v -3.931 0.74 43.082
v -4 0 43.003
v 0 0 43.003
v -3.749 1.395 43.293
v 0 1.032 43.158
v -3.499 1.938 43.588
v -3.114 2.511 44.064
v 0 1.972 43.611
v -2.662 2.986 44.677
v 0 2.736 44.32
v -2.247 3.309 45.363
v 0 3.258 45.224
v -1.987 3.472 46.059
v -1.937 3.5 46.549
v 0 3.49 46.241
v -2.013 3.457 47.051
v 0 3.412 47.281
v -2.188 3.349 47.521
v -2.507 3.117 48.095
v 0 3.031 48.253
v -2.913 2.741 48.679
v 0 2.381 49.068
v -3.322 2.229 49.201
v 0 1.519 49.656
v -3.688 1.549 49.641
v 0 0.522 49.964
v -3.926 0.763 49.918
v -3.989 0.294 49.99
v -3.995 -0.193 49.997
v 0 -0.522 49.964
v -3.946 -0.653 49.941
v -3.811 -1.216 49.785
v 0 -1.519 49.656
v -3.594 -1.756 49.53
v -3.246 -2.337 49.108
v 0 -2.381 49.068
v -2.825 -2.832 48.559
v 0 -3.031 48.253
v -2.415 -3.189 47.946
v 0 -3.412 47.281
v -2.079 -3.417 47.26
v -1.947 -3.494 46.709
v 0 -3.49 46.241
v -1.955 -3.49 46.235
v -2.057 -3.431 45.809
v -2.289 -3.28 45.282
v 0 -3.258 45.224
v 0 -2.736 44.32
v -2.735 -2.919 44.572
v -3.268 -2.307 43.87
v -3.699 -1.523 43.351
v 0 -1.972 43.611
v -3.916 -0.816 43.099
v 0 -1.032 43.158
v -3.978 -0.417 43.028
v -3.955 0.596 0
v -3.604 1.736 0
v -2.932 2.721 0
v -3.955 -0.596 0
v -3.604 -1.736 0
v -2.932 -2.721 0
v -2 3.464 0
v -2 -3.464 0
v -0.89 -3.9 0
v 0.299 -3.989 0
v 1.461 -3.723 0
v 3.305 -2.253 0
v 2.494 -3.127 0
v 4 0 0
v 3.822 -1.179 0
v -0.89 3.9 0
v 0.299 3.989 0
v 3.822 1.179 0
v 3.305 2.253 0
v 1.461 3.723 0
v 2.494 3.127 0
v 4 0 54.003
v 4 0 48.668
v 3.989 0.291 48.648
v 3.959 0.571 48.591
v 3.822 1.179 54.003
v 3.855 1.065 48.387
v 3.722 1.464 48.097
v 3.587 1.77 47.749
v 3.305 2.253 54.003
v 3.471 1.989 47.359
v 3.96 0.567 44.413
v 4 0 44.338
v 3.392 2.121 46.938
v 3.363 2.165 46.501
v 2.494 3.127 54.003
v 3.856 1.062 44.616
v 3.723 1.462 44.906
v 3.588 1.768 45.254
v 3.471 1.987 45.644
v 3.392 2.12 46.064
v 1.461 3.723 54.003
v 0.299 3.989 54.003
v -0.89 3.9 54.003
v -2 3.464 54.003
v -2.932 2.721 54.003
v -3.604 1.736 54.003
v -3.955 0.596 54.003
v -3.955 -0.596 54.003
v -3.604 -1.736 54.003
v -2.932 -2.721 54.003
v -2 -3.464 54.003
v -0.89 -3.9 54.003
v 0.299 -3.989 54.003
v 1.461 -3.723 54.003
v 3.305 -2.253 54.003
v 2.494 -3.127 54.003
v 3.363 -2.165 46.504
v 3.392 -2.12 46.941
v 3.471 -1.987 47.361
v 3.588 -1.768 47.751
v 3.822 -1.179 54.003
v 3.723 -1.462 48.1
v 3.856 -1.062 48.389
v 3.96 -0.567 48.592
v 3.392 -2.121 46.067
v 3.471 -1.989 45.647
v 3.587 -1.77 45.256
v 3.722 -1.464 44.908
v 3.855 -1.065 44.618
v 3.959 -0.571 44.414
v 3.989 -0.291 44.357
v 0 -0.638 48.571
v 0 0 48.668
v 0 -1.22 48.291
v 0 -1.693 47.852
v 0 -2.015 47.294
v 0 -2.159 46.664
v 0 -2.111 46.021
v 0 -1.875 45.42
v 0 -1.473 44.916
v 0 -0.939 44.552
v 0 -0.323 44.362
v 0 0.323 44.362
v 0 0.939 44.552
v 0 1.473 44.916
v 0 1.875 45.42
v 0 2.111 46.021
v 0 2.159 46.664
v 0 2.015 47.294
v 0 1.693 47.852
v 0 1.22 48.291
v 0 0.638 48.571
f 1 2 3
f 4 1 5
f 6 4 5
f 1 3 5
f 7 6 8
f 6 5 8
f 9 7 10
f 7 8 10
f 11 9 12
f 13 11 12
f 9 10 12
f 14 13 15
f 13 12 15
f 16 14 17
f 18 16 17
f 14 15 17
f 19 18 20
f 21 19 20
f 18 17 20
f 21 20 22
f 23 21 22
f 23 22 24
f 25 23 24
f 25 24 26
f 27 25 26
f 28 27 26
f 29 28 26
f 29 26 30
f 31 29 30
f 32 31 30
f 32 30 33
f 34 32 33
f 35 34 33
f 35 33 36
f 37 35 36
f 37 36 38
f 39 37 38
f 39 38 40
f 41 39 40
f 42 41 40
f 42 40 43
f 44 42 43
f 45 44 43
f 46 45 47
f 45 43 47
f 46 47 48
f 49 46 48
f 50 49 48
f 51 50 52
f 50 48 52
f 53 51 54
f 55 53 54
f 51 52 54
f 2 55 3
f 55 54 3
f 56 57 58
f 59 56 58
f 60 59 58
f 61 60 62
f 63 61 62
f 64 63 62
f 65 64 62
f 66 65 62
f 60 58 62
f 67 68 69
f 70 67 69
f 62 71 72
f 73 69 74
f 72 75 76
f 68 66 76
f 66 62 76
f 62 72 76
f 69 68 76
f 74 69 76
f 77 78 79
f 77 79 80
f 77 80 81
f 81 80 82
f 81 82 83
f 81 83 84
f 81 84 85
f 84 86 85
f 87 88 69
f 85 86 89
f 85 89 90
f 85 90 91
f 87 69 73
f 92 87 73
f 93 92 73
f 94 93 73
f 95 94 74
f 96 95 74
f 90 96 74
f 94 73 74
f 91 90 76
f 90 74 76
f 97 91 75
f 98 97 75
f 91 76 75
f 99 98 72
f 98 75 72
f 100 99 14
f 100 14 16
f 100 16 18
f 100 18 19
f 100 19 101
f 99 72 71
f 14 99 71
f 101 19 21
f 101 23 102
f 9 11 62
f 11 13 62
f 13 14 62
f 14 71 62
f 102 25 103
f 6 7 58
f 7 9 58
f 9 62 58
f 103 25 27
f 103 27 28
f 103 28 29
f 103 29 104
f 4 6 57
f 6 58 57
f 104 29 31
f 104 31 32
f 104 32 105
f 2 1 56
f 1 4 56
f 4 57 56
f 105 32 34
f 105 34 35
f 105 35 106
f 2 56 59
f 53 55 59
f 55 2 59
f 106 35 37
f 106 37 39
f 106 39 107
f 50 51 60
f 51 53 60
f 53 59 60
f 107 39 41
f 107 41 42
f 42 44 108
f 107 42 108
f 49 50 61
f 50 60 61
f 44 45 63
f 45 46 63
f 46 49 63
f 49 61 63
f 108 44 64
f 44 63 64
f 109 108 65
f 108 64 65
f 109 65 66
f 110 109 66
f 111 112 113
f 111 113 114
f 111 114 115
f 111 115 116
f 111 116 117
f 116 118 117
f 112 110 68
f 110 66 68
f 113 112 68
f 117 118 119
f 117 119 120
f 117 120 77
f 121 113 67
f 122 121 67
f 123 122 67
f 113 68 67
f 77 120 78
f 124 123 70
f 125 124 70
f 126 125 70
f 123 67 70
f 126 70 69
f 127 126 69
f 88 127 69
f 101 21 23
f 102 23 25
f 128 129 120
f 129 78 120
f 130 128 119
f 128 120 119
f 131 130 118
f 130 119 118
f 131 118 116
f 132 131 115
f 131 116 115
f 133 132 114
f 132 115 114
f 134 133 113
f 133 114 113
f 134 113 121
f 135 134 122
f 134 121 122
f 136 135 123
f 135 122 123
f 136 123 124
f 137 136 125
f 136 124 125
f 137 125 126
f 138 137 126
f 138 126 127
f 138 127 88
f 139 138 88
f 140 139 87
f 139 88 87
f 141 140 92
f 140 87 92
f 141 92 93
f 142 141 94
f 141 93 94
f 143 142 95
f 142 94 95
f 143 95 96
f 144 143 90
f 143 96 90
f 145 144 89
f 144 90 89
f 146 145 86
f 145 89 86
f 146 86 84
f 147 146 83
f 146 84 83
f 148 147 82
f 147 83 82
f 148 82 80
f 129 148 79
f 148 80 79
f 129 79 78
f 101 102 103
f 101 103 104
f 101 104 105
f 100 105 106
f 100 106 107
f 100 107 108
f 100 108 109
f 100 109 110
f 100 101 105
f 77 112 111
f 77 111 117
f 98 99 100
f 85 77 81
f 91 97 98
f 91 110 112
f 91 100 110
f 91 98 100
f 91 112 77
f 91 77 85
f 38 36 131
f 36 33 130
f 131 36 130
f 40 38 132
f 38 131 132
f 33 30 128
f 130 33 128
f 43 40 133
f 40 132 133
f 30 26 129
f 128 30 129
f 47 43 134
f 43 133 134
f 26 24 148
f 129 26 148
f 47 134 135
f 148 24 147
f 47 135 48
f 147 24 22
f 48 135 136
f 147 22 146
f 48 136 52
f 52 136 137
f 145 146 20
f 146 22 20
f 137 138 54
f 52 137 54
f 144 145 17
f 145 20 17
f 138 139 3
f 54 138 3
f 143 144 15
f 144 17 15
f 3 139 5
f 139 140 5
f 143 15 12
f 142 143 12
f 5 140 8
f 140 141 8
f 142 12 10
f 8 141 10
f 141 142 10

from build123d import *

# Parameters (mm, degrees)
SKETCH1_R           = 4
BOSS_EXTRUDE1_DEPTH = 54.002621
SKETCH2_R           = 2.165
CUT_EXTRUDE1_DEPTH  = 9
SKETCH4_R           = 3.5
CUT_EXTRUDE2_DEPTH  = 55.298094693


with BuildPart() as part:
    # Sketch1 → Boss-Extrude1 (new body)
    with BuildSketch(Plane.XY):
        Circle(SKETCH1_R)
    extrude(amount=BOSS_EXTRUDE1_DEPTH)

    # Sketch2 → Cut-Extrude1 (cut, symmetric)
    with BuildSketch(Plane(origin=(0, 0, 0), x_dir=(0, 0, -1), z_dir=(1, 0, 0))):
        with Locations(Location((-46.502621, 0, 0), (0, 0, 180))):
            Circle(SKETCH2_R)
    extrude(amount=CUT_EXTRUDE1_DEPTH, both=True, mode=Mode.SUBTRACT)

    # Sketch4 → Cut-Extrude2 (cut, through all)
    with BuildSketch(Plane(origin=(0, 0, 0), x_dir=(0, 0, -1), z_dir=(1, 0, 0))):
        with Locations((-46.502621, 0)):
            Circle(SKETCH4_R)
    extrude(amount=-CUT_EXTRUDE2_DEPTH, mode=Mode.SUBTRACT)


solid = part.part
